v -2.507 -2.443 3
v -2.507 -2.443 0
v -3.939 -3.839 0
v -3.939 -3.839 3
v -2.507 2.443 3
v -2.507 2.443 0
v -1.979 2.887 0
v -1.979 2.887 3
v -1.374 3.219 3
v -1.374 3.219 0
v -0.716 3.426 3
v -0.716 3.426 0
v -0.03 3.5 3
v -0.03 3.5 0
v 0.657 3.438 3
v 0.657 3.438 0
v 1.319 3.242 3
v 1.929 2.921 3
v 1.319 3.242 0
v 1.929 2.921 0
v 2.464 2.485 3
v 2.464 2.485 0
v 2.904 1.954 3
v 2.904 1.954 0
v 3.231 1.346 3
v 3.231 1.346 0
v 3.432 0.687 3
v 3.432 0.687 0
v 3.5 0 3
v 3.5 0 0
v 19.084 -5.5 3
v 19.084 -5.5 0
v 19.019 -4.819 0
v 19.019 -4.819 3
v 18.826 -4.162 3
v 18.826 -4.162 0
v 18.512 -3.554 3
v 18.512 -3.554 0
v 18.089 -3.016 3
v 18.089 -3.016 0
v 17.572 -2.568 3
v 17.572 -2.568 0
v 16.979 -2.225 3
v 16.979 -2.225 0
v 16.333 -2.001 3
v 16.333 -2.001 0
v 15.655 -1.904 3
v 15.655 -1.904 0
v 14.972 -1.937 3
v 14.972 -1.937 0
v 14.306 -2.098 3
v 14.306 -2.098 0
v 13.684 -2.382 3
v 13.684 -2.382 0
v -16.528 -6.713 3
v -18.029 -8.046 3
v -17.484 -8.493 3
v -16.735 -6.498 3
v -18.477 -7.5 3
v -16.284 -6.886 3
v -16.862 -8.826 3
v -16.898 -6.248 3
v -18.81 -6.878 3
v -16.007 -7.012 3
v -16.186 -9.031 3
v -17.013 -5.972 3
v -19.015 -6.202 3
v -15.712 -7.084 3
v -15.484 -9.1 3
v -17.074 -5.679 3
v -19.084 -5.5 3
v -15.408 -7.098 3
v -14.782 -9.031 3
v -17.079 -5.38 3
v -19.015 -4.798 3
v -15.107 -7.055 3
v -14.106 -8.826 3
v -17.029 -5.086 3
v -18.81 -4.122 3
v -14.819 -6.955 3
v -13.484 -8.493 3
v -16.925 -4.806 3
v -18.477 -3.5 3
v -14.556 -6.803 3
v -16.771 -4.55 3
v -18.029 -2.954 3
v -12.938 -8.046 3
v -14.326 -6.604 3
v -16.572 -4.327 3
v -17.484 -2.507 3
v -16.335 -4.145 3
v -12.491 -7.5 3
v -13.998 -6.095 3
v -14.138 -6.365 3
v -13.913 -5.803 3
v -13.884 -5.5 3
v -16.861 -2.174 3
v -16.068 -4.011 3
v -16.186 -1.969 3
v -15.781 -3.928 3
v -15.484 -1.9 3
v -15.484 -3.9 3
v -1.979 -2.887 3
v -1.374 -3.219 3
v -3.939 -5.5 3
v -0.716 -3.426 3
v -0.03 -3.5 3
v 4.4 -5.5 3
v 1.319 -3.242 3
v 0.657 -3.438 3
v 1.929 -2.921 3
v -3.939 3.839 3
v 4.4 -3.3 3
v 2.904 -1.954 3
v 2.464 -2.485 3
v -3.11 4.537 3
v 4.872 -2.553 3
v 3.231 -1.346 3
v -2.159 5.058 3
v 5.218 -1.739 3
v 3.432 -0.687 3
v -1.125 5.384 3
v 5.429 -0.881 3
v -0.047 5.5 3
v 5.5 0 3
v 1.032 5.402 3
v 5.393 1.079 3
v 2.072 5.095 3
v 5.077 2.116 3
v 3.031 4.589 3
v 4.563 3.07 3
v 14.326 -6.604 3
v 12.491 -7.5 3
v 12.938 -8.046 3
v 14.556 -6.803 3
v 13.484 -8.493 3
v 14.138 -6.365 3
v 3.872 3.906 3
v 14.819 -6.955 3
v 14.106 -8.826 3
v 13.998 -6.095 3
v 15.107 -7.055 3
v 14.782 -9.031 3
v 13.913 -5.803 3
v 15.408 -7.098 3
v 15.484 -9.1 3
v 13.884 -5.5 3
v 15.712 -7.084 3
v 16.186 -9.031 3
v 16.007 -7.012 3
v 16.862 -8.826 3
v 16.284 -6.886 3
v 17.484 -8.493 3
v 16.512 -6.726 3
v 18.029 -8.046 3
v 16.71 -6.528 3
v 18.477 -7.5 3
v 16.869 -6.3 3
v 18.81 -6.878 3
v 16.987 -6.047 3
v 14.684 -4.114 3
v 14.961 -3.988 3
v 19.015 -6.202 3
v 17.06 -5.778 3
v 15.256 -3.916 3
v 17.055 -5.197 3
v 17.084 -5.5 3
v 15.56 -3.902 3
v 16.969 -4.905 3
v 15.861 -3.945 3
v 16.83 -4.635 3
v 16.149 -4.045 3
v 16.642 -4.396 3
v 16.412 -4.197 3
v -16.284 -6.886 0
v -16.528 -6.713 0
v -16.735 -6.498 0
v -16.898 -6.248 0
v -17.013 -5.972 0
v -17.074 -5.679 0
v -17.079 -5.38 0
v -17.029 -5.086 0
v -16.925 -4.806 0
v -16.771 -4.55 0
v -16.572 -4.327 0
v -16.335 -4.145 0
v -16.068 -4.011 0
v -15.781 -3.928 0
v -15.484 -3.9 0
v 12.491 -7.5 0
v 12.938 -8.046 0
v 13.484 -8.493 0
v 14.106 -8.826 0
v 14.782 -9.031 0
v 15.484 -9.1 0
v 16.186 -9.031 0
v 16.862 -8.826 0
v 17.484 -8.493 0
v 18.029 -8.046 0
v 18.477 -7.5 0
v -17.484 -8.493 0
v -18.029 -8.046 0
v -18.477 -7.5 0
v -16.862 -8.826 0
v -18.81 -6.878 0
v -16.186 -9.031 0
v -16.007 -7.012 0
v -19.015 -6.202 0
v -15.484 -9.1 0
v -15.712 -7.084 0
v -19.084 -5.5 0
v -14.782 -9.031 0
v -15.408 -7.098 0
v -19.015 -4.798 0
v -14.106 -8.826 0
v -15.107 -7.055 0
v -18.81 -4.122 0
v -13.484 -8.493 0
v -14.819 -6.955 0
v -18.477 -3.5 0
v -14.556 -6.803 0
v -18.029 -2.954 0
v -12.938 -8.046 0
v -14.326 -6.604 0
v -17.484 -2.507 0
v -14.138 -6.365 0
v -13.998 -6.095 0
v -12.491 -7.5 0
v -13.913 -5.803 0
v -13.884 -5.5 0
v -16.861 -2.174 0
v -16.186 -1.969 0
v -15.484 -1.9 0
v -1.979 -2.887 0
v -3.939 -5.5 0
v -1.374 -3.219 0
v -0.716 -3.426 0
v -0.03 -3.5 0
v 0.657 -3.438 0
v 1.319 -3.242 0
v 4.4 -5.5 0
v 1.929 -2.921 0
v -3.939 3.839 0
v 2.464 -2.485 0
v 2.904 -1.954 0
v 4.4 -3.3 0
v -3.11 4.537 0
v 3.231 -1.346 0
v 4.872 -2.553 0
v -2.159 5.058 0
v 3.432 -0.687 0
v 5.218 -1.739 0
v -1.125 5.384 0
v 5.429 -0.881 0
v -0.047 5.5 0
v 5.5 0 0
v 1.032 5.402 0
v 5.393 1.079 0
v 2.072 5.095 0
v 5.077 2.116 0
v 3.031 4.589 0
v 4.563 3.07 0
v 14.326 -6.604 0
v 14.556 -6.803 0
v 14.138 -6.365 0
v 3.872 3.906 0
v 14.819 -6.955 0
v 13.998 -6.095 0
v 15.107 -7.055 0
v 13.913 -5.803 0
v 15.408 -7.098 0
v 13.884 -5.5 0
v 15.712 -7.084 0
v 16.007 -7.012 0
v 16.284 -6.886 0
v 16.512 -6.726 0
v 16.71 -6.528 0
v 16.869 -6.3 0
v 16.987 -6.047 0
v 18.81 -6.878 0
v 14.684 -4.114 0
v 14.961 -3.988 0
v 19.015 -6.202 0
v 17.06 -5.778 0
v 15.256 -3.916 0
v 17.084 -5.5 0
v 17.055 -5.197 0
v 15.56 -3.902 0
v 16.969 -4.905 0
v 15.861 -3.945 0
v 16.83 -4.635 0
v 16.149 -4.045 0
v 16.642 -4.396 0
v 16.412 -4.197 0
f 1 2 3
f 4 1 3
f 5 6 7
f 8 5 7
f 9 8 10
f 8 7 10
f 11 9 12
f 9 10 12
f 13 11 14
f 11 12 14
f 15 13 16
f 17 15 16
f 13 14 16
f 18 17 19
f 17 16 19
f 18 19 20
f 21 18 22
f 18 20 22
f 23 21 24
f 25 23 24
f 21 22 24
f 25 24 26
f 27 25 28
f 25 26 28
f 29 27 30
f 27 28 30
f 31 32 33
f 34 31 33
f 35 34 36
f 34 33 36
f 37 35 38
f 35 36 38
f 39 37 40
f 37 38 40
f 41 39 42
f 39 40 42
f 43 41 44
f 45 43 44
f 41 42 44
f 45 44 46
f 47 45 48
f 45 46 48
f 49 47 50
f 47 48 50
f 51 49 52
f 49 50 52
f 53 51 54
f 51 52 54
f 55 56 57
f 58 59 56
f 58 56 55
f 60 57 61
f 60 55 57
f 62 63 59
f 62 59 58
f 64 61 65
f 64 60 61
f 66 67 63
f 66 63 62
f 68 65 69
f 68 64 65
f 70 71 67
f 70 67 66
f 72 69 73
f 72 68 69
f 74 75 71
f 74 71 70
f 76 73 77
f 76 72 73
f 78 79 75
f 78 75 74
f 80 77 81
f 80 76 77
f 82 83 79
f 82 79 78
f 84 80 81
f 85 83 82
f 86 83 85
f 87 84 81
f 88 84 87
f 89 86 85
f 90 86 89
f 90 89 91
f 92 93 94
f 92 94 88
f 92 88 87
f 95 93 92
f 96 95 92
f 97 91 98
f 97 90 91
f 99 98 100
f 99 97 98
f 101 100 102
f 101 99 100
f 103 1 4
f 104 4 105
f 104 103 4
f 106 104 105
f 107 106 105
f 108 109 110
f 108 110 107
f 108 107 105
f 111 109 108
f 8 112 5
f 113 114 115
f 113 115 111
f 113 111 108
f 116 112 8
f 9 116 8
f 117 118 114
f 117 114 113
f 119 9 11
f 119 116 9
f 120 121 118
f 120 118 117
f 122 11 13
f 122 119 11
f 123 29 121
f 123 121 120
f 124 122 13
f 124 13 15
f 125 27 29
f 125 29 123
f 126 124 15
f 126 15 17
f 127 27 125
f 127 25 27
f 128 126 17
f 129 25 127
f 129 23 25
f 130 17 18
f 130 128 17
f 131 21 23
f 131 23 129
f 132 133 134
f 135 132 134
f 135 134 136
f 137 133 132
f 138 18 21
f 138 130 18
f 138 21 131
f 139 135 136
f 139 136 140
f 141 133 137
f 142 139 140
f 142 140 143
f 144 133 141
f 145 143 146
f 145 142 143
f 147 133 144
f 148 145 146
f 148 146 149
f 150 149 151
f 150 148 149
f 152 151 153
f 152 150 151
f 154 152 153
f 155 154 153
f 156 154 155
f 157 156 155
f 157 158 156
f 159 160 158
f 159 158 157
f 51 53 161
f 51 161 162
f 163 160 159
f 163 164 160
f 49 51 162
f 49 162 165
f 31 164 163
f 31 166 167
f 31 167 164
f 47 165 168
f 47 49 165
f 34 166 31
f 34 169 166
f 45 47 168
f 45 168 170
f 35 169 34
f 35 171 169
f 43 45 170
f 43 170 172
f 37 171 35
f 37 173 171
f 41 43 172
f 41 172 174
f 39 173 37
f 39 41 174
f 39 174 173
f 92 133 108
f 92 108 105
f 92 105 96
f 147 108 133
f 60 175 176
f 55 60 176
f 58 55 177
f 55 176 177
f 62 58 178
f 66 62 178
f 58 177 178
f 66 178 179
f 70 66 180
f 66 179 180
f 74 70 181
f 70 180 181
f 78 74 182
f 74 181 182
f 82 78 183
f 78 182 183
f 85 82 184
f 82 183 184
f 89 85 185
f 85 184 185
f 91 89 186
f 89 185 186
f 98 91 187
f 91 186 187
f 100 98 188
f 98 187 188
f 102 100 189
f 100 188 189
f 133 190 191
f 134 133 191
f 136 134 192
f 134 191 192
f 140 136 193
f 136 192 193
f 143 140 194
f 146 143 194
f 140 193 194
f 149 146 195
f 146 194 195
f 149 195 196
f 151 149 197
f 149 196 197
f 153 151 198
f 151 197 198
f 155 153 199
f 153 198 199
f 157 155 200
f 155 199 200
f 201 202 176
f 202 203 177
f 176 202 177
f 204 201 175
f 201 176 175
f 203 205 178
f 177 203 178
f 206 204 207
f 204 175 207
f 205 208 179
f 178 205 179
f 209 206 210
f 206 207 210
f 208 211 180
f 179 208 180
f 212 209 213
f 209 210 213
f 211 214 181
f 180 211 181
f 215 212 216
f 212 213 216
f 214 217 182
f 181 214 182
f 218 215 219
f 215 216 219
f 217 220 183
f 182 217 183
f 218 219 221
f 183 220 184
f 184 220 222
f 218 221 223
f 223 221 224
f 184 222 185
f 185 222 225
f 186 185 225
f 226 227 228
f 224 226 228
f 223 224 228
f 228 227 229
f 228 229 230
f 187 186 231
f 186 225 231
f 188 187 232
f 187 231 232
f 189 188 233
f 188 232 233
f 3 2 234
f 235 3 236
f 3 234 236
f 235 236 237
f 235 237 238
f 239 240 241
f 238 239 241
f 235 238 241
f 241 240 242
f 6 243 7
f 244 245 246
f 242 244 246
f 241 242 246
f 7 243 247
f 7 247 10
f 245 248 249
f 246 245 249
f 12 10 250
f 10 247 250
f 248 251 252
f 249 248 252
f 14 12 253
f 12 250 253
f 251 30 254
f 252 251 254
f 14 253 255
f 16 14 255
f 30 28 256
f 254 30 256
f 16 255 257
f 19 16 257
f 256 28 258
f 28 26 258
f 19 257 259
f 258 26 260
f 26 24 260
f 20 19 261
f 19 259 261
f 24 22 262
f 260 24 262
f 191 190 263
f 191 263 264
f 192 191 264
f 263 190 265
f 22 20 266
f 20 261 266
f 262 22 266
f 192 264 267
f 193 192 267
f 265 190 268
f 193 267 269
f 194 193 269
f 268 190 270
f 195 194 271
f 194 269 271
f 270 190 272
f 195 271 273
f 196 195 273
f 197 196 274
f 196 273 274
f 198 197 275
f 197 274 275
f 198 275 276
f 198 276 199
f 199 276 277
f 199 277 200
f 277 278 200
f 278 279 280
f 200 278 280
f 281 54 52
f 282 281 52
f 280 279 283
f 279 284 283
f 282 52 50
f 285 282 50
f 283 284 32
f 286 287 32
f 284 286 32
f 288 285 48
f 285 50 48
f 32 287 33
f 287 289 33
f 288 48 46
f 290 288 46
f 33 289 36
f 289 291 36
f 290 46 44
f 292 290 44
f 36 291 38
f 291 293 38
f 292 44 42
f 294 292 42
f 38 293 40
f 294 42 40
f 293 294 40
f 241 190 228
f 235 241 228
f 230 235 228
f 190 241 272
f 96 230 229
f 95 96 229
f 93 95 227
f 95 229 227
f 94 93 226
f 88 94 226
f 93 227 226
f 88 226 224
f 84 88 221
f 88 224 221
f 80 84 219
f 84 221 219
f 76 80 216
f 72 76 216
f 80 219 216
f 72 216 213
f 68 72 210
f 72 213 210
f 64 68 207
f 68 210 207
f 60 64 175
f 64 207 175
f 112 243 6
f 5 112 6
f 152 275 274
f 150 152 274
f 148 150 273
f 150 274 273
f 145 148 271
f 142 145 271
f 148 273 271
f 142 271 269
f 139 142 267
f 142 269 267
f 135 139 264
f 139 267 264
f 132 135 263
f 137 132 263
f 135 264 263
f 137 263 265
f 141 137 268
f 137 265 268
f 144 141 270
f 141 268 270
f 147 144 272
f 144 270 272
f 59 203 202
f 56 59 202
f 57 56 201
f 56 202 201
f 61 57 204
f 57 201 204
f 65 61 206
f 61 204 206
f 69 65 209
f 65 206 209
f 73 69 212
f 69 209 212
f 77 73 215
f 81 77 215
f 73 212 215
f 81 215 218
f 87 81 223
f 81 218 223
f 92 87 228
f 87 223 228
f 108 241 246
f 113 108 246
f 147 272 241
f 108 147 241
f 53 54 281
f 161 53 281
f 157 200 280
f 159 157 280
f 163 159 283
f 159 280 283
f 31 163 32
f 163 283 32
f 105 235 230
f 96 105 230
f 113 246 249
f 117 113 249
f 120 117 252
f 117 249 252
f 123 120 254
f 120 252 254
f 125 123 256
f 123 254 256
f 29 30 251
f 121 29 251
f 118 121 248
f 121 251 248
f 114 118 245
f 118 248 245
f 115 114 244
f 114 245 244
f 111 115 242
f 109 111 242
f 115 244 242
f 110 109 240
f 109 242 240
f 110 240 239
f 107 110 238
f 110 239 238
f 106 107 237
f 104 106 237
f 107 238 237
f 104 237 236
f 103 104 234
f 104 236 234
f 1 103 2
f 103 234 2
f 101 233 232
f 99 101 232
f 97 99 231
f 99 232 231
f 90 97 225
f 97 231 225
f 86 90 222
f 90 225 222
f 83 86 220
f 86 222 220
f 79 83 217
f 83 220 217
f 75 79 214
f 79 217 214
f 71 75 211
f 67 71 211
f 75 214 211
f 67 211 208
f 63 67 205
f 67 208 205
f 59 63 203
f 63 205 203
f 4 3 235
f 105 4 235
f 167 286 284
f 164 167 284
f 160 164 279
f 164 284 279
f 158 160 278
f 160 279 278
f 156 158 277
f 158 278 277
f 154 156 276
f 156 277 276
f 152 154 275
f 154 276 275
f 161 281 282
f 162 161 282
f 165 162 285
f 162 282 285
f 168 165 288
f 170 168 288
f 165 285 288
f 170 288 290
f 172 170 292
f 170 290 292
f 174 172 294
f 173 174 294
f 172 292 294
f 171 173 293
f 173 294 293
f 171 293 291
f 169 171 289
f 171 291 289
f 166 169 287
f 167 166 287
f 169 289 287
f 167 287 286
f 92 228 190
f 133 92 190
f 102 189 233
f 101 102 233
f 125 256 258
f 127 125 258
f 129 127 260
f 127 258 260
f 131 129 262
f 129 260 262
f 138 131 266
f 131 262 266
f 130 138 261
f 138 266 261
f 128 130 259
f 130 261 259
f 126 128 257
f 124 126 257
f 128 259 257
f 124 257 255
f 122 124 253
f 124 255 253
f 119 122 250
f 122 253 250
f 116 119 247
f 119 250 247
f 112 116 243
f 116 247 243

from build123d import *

# Parameters (mm, degrees)
F1_DEPTH = 3


with BuildPart() as f1:
    # F0 (on Top) → F1 (new body)
    with BuildSketch(Plane.XY):
        with BuildLine():
            Line((4.3997598665, -5.5), (0, -5.5))
            Line((0, -5.5), (-3.9389383459, -5.5))
            Line((-3.9389383459, -5.5), (-11.8838464236, -5.5))
            ThreePointArc((-11.8838464236, -5.5), (-12.0388519916, -6.5449944321), (-12.4905205142, -7.5))
            Line((-12.4905205142, -7.5), (12.4905205142, -7.5))
            ThreePointArc((12.4905205142, -7.5), (12.0388519916, -6.5449944321), (11.8838464236, -5.5))
            Line((11.8838464236, -5.5), (4.3997598665, -5.5))
        make_face()
        with BuildLine():
            ThreePointArc((-12.4905205142, -7.5), (-12.0388519916, -6.5449944321), (-11.8838464236, -5.5))
            Line((-11.8838464236, -5.5), (-13.8838464236, -5.5))
            ThreePointArc((-13.8838464236, -5.5), (-14.6838464236, -6.8856406461), (-16.2838464236, -6.8856406461))
            Line((-16.2838464236, -6.8856406461), (-16.638546962, -7.5))
            Line((-16.638546962, -7.5), (-12.4905205142, -7.5))
        make_face()
        with BuildLine():
            Line((-16.638546962, -7.5), (-16.2838464236, -6.8856406461))
            ThreePointArc((-16.2838464236, -6.8856406461), (-17.0293277457, -5.0858895278), (-15.4838464236, -3.9))
            Line((-15.4838464236, -3.9), (-15.4838464236, -1.9))
            ThreePointArc((-15.4838464236, -1.9), (-18.6587479969, -3.8029437252), (-18.4771723331, -7.5))
            Line((-18.4771723331, -7.5), (-16.638546962, -7.5))
        make_face()
        with BuildLine():
            Line((13.8838464236, -5.5), (11.8838464236, -5.5))
            ThreePointArc((11.8838464236, -5.5), (12.0388519916, -6.5449944321), (12.4905205142, -7.5))
            Line((12.4905205142, -7.5), (16.638546962, -7.5))
            Line((16.638546962, -7.5), (16.2838464236, -6.8856406461))
            ThreePointArc((16.2838464236, -6.8856406461), (14.6838464236, -6.8856406461), (13.8838464236, -5.5))
        make_face()
        with BuildLine():
            ThreePointArc((19.0838464236, -5.5), (17.2838464236, -2.3823085464), (13.6838464236, -2.3823085464))
            Line((13.6838464236, -2.3823085464), (14.6838464236, -4.1143593539))
            ThreePointArc((14.6838464236, -4.1143593539), (16.2838464236, -4.1143593539), (17.0838464236, -5.5))
            ThreePointArc((17.0838464236, -5.5), (16.8694870697, -6.3), (16.2838464236, -6.8856406461))
            Line((16.2838464236, -6.8856406461), (16.638546962, -7.5))
            Line((16.638546962, -7.5), (18.4771723331, -7.5))
            ThreePointArc((18.4771723331, -7.5), (18.9288408557, -6.5449944321), (19.0838464236, -5.5))
        make_face()
        with BuildLine():
            ThreePointArc((-2.5065971292, 2.4427383879), (1.3185048441, 3.2421512883), (3.5, 0))
            ThreePointArc((3.5, 0), (1.3185048441, -3.2421512883), (-2.5065971292, -2.4427383879))
            Line((-2.5065971292, -2.4427383879), (-3.9389383459, -3.8385888953))
            ThreePointArc((-3.9389383459, -3.8385888953), (-2.1374939855, -5.0676542366), (0, -5.5))
            ThreePointArc((0, -5.5), (2.4594957974, -4.9194390354), (4.3997598665, -3.3003201537))
            ThreePointArc((4.3997598665, -3.3003201537), (5.2176948582, -1.7394425449), (5.5, 0))
            ThreePointArc((5.5, 0), (2.0719361836, 5.0948091673), (-3.9389383459, 3.8385888953))
            Line((-3.9389383459, 3.8385888953), (-2.5065971292, 2.4427383879))
        make_face()
        with BuildLine():
            ThreePointArc((0, -5.5), (-2.1374939855, -5.0676542366), (-3.9389383459, -3.8385888953))
            Line((-3.9389383459, -3.8385888953), (-3.9389383459, -5.5))
            Line((-3.9389383459, -5.5), (0, -5.5))
        make_face()
        with BuildLine():
            ThreePointArc((4.3997598665, -3.3003201537), (2.4594957974, -4.9194390354), (0, -5.5))
            Line((0, -5.5), (4.3997598665, -5.5))
            Line((4.3997598665, -5.5), (4.3997598665, -3.3003201537))
        make_face()
        with BuildLine():
            Line((16.638546962, -7.5), (12.4905205142, -7.5))
            ThreePointArc((12.4905205142, -7.5), (15.4838464236, -9.1), (18.4771723331, -7.5))
            Line((18.4771723331, -7.5), (16.638546962, -7.5))
        make_face()
        with BuildLine():
            ThreePointArc((-18.4771723331, -7.5), (-15.4838464236, -9.1), (-12.4905205142, -7.5))
            Line((-12.4905205142, -7.5), (-16.638546962, -7.5))
            Line((-16.638546962, -7.5), (-18.4771723331, -7.5))
        make_face()
    extrude(amount=F1_DEPTH)


solid = f1.part
